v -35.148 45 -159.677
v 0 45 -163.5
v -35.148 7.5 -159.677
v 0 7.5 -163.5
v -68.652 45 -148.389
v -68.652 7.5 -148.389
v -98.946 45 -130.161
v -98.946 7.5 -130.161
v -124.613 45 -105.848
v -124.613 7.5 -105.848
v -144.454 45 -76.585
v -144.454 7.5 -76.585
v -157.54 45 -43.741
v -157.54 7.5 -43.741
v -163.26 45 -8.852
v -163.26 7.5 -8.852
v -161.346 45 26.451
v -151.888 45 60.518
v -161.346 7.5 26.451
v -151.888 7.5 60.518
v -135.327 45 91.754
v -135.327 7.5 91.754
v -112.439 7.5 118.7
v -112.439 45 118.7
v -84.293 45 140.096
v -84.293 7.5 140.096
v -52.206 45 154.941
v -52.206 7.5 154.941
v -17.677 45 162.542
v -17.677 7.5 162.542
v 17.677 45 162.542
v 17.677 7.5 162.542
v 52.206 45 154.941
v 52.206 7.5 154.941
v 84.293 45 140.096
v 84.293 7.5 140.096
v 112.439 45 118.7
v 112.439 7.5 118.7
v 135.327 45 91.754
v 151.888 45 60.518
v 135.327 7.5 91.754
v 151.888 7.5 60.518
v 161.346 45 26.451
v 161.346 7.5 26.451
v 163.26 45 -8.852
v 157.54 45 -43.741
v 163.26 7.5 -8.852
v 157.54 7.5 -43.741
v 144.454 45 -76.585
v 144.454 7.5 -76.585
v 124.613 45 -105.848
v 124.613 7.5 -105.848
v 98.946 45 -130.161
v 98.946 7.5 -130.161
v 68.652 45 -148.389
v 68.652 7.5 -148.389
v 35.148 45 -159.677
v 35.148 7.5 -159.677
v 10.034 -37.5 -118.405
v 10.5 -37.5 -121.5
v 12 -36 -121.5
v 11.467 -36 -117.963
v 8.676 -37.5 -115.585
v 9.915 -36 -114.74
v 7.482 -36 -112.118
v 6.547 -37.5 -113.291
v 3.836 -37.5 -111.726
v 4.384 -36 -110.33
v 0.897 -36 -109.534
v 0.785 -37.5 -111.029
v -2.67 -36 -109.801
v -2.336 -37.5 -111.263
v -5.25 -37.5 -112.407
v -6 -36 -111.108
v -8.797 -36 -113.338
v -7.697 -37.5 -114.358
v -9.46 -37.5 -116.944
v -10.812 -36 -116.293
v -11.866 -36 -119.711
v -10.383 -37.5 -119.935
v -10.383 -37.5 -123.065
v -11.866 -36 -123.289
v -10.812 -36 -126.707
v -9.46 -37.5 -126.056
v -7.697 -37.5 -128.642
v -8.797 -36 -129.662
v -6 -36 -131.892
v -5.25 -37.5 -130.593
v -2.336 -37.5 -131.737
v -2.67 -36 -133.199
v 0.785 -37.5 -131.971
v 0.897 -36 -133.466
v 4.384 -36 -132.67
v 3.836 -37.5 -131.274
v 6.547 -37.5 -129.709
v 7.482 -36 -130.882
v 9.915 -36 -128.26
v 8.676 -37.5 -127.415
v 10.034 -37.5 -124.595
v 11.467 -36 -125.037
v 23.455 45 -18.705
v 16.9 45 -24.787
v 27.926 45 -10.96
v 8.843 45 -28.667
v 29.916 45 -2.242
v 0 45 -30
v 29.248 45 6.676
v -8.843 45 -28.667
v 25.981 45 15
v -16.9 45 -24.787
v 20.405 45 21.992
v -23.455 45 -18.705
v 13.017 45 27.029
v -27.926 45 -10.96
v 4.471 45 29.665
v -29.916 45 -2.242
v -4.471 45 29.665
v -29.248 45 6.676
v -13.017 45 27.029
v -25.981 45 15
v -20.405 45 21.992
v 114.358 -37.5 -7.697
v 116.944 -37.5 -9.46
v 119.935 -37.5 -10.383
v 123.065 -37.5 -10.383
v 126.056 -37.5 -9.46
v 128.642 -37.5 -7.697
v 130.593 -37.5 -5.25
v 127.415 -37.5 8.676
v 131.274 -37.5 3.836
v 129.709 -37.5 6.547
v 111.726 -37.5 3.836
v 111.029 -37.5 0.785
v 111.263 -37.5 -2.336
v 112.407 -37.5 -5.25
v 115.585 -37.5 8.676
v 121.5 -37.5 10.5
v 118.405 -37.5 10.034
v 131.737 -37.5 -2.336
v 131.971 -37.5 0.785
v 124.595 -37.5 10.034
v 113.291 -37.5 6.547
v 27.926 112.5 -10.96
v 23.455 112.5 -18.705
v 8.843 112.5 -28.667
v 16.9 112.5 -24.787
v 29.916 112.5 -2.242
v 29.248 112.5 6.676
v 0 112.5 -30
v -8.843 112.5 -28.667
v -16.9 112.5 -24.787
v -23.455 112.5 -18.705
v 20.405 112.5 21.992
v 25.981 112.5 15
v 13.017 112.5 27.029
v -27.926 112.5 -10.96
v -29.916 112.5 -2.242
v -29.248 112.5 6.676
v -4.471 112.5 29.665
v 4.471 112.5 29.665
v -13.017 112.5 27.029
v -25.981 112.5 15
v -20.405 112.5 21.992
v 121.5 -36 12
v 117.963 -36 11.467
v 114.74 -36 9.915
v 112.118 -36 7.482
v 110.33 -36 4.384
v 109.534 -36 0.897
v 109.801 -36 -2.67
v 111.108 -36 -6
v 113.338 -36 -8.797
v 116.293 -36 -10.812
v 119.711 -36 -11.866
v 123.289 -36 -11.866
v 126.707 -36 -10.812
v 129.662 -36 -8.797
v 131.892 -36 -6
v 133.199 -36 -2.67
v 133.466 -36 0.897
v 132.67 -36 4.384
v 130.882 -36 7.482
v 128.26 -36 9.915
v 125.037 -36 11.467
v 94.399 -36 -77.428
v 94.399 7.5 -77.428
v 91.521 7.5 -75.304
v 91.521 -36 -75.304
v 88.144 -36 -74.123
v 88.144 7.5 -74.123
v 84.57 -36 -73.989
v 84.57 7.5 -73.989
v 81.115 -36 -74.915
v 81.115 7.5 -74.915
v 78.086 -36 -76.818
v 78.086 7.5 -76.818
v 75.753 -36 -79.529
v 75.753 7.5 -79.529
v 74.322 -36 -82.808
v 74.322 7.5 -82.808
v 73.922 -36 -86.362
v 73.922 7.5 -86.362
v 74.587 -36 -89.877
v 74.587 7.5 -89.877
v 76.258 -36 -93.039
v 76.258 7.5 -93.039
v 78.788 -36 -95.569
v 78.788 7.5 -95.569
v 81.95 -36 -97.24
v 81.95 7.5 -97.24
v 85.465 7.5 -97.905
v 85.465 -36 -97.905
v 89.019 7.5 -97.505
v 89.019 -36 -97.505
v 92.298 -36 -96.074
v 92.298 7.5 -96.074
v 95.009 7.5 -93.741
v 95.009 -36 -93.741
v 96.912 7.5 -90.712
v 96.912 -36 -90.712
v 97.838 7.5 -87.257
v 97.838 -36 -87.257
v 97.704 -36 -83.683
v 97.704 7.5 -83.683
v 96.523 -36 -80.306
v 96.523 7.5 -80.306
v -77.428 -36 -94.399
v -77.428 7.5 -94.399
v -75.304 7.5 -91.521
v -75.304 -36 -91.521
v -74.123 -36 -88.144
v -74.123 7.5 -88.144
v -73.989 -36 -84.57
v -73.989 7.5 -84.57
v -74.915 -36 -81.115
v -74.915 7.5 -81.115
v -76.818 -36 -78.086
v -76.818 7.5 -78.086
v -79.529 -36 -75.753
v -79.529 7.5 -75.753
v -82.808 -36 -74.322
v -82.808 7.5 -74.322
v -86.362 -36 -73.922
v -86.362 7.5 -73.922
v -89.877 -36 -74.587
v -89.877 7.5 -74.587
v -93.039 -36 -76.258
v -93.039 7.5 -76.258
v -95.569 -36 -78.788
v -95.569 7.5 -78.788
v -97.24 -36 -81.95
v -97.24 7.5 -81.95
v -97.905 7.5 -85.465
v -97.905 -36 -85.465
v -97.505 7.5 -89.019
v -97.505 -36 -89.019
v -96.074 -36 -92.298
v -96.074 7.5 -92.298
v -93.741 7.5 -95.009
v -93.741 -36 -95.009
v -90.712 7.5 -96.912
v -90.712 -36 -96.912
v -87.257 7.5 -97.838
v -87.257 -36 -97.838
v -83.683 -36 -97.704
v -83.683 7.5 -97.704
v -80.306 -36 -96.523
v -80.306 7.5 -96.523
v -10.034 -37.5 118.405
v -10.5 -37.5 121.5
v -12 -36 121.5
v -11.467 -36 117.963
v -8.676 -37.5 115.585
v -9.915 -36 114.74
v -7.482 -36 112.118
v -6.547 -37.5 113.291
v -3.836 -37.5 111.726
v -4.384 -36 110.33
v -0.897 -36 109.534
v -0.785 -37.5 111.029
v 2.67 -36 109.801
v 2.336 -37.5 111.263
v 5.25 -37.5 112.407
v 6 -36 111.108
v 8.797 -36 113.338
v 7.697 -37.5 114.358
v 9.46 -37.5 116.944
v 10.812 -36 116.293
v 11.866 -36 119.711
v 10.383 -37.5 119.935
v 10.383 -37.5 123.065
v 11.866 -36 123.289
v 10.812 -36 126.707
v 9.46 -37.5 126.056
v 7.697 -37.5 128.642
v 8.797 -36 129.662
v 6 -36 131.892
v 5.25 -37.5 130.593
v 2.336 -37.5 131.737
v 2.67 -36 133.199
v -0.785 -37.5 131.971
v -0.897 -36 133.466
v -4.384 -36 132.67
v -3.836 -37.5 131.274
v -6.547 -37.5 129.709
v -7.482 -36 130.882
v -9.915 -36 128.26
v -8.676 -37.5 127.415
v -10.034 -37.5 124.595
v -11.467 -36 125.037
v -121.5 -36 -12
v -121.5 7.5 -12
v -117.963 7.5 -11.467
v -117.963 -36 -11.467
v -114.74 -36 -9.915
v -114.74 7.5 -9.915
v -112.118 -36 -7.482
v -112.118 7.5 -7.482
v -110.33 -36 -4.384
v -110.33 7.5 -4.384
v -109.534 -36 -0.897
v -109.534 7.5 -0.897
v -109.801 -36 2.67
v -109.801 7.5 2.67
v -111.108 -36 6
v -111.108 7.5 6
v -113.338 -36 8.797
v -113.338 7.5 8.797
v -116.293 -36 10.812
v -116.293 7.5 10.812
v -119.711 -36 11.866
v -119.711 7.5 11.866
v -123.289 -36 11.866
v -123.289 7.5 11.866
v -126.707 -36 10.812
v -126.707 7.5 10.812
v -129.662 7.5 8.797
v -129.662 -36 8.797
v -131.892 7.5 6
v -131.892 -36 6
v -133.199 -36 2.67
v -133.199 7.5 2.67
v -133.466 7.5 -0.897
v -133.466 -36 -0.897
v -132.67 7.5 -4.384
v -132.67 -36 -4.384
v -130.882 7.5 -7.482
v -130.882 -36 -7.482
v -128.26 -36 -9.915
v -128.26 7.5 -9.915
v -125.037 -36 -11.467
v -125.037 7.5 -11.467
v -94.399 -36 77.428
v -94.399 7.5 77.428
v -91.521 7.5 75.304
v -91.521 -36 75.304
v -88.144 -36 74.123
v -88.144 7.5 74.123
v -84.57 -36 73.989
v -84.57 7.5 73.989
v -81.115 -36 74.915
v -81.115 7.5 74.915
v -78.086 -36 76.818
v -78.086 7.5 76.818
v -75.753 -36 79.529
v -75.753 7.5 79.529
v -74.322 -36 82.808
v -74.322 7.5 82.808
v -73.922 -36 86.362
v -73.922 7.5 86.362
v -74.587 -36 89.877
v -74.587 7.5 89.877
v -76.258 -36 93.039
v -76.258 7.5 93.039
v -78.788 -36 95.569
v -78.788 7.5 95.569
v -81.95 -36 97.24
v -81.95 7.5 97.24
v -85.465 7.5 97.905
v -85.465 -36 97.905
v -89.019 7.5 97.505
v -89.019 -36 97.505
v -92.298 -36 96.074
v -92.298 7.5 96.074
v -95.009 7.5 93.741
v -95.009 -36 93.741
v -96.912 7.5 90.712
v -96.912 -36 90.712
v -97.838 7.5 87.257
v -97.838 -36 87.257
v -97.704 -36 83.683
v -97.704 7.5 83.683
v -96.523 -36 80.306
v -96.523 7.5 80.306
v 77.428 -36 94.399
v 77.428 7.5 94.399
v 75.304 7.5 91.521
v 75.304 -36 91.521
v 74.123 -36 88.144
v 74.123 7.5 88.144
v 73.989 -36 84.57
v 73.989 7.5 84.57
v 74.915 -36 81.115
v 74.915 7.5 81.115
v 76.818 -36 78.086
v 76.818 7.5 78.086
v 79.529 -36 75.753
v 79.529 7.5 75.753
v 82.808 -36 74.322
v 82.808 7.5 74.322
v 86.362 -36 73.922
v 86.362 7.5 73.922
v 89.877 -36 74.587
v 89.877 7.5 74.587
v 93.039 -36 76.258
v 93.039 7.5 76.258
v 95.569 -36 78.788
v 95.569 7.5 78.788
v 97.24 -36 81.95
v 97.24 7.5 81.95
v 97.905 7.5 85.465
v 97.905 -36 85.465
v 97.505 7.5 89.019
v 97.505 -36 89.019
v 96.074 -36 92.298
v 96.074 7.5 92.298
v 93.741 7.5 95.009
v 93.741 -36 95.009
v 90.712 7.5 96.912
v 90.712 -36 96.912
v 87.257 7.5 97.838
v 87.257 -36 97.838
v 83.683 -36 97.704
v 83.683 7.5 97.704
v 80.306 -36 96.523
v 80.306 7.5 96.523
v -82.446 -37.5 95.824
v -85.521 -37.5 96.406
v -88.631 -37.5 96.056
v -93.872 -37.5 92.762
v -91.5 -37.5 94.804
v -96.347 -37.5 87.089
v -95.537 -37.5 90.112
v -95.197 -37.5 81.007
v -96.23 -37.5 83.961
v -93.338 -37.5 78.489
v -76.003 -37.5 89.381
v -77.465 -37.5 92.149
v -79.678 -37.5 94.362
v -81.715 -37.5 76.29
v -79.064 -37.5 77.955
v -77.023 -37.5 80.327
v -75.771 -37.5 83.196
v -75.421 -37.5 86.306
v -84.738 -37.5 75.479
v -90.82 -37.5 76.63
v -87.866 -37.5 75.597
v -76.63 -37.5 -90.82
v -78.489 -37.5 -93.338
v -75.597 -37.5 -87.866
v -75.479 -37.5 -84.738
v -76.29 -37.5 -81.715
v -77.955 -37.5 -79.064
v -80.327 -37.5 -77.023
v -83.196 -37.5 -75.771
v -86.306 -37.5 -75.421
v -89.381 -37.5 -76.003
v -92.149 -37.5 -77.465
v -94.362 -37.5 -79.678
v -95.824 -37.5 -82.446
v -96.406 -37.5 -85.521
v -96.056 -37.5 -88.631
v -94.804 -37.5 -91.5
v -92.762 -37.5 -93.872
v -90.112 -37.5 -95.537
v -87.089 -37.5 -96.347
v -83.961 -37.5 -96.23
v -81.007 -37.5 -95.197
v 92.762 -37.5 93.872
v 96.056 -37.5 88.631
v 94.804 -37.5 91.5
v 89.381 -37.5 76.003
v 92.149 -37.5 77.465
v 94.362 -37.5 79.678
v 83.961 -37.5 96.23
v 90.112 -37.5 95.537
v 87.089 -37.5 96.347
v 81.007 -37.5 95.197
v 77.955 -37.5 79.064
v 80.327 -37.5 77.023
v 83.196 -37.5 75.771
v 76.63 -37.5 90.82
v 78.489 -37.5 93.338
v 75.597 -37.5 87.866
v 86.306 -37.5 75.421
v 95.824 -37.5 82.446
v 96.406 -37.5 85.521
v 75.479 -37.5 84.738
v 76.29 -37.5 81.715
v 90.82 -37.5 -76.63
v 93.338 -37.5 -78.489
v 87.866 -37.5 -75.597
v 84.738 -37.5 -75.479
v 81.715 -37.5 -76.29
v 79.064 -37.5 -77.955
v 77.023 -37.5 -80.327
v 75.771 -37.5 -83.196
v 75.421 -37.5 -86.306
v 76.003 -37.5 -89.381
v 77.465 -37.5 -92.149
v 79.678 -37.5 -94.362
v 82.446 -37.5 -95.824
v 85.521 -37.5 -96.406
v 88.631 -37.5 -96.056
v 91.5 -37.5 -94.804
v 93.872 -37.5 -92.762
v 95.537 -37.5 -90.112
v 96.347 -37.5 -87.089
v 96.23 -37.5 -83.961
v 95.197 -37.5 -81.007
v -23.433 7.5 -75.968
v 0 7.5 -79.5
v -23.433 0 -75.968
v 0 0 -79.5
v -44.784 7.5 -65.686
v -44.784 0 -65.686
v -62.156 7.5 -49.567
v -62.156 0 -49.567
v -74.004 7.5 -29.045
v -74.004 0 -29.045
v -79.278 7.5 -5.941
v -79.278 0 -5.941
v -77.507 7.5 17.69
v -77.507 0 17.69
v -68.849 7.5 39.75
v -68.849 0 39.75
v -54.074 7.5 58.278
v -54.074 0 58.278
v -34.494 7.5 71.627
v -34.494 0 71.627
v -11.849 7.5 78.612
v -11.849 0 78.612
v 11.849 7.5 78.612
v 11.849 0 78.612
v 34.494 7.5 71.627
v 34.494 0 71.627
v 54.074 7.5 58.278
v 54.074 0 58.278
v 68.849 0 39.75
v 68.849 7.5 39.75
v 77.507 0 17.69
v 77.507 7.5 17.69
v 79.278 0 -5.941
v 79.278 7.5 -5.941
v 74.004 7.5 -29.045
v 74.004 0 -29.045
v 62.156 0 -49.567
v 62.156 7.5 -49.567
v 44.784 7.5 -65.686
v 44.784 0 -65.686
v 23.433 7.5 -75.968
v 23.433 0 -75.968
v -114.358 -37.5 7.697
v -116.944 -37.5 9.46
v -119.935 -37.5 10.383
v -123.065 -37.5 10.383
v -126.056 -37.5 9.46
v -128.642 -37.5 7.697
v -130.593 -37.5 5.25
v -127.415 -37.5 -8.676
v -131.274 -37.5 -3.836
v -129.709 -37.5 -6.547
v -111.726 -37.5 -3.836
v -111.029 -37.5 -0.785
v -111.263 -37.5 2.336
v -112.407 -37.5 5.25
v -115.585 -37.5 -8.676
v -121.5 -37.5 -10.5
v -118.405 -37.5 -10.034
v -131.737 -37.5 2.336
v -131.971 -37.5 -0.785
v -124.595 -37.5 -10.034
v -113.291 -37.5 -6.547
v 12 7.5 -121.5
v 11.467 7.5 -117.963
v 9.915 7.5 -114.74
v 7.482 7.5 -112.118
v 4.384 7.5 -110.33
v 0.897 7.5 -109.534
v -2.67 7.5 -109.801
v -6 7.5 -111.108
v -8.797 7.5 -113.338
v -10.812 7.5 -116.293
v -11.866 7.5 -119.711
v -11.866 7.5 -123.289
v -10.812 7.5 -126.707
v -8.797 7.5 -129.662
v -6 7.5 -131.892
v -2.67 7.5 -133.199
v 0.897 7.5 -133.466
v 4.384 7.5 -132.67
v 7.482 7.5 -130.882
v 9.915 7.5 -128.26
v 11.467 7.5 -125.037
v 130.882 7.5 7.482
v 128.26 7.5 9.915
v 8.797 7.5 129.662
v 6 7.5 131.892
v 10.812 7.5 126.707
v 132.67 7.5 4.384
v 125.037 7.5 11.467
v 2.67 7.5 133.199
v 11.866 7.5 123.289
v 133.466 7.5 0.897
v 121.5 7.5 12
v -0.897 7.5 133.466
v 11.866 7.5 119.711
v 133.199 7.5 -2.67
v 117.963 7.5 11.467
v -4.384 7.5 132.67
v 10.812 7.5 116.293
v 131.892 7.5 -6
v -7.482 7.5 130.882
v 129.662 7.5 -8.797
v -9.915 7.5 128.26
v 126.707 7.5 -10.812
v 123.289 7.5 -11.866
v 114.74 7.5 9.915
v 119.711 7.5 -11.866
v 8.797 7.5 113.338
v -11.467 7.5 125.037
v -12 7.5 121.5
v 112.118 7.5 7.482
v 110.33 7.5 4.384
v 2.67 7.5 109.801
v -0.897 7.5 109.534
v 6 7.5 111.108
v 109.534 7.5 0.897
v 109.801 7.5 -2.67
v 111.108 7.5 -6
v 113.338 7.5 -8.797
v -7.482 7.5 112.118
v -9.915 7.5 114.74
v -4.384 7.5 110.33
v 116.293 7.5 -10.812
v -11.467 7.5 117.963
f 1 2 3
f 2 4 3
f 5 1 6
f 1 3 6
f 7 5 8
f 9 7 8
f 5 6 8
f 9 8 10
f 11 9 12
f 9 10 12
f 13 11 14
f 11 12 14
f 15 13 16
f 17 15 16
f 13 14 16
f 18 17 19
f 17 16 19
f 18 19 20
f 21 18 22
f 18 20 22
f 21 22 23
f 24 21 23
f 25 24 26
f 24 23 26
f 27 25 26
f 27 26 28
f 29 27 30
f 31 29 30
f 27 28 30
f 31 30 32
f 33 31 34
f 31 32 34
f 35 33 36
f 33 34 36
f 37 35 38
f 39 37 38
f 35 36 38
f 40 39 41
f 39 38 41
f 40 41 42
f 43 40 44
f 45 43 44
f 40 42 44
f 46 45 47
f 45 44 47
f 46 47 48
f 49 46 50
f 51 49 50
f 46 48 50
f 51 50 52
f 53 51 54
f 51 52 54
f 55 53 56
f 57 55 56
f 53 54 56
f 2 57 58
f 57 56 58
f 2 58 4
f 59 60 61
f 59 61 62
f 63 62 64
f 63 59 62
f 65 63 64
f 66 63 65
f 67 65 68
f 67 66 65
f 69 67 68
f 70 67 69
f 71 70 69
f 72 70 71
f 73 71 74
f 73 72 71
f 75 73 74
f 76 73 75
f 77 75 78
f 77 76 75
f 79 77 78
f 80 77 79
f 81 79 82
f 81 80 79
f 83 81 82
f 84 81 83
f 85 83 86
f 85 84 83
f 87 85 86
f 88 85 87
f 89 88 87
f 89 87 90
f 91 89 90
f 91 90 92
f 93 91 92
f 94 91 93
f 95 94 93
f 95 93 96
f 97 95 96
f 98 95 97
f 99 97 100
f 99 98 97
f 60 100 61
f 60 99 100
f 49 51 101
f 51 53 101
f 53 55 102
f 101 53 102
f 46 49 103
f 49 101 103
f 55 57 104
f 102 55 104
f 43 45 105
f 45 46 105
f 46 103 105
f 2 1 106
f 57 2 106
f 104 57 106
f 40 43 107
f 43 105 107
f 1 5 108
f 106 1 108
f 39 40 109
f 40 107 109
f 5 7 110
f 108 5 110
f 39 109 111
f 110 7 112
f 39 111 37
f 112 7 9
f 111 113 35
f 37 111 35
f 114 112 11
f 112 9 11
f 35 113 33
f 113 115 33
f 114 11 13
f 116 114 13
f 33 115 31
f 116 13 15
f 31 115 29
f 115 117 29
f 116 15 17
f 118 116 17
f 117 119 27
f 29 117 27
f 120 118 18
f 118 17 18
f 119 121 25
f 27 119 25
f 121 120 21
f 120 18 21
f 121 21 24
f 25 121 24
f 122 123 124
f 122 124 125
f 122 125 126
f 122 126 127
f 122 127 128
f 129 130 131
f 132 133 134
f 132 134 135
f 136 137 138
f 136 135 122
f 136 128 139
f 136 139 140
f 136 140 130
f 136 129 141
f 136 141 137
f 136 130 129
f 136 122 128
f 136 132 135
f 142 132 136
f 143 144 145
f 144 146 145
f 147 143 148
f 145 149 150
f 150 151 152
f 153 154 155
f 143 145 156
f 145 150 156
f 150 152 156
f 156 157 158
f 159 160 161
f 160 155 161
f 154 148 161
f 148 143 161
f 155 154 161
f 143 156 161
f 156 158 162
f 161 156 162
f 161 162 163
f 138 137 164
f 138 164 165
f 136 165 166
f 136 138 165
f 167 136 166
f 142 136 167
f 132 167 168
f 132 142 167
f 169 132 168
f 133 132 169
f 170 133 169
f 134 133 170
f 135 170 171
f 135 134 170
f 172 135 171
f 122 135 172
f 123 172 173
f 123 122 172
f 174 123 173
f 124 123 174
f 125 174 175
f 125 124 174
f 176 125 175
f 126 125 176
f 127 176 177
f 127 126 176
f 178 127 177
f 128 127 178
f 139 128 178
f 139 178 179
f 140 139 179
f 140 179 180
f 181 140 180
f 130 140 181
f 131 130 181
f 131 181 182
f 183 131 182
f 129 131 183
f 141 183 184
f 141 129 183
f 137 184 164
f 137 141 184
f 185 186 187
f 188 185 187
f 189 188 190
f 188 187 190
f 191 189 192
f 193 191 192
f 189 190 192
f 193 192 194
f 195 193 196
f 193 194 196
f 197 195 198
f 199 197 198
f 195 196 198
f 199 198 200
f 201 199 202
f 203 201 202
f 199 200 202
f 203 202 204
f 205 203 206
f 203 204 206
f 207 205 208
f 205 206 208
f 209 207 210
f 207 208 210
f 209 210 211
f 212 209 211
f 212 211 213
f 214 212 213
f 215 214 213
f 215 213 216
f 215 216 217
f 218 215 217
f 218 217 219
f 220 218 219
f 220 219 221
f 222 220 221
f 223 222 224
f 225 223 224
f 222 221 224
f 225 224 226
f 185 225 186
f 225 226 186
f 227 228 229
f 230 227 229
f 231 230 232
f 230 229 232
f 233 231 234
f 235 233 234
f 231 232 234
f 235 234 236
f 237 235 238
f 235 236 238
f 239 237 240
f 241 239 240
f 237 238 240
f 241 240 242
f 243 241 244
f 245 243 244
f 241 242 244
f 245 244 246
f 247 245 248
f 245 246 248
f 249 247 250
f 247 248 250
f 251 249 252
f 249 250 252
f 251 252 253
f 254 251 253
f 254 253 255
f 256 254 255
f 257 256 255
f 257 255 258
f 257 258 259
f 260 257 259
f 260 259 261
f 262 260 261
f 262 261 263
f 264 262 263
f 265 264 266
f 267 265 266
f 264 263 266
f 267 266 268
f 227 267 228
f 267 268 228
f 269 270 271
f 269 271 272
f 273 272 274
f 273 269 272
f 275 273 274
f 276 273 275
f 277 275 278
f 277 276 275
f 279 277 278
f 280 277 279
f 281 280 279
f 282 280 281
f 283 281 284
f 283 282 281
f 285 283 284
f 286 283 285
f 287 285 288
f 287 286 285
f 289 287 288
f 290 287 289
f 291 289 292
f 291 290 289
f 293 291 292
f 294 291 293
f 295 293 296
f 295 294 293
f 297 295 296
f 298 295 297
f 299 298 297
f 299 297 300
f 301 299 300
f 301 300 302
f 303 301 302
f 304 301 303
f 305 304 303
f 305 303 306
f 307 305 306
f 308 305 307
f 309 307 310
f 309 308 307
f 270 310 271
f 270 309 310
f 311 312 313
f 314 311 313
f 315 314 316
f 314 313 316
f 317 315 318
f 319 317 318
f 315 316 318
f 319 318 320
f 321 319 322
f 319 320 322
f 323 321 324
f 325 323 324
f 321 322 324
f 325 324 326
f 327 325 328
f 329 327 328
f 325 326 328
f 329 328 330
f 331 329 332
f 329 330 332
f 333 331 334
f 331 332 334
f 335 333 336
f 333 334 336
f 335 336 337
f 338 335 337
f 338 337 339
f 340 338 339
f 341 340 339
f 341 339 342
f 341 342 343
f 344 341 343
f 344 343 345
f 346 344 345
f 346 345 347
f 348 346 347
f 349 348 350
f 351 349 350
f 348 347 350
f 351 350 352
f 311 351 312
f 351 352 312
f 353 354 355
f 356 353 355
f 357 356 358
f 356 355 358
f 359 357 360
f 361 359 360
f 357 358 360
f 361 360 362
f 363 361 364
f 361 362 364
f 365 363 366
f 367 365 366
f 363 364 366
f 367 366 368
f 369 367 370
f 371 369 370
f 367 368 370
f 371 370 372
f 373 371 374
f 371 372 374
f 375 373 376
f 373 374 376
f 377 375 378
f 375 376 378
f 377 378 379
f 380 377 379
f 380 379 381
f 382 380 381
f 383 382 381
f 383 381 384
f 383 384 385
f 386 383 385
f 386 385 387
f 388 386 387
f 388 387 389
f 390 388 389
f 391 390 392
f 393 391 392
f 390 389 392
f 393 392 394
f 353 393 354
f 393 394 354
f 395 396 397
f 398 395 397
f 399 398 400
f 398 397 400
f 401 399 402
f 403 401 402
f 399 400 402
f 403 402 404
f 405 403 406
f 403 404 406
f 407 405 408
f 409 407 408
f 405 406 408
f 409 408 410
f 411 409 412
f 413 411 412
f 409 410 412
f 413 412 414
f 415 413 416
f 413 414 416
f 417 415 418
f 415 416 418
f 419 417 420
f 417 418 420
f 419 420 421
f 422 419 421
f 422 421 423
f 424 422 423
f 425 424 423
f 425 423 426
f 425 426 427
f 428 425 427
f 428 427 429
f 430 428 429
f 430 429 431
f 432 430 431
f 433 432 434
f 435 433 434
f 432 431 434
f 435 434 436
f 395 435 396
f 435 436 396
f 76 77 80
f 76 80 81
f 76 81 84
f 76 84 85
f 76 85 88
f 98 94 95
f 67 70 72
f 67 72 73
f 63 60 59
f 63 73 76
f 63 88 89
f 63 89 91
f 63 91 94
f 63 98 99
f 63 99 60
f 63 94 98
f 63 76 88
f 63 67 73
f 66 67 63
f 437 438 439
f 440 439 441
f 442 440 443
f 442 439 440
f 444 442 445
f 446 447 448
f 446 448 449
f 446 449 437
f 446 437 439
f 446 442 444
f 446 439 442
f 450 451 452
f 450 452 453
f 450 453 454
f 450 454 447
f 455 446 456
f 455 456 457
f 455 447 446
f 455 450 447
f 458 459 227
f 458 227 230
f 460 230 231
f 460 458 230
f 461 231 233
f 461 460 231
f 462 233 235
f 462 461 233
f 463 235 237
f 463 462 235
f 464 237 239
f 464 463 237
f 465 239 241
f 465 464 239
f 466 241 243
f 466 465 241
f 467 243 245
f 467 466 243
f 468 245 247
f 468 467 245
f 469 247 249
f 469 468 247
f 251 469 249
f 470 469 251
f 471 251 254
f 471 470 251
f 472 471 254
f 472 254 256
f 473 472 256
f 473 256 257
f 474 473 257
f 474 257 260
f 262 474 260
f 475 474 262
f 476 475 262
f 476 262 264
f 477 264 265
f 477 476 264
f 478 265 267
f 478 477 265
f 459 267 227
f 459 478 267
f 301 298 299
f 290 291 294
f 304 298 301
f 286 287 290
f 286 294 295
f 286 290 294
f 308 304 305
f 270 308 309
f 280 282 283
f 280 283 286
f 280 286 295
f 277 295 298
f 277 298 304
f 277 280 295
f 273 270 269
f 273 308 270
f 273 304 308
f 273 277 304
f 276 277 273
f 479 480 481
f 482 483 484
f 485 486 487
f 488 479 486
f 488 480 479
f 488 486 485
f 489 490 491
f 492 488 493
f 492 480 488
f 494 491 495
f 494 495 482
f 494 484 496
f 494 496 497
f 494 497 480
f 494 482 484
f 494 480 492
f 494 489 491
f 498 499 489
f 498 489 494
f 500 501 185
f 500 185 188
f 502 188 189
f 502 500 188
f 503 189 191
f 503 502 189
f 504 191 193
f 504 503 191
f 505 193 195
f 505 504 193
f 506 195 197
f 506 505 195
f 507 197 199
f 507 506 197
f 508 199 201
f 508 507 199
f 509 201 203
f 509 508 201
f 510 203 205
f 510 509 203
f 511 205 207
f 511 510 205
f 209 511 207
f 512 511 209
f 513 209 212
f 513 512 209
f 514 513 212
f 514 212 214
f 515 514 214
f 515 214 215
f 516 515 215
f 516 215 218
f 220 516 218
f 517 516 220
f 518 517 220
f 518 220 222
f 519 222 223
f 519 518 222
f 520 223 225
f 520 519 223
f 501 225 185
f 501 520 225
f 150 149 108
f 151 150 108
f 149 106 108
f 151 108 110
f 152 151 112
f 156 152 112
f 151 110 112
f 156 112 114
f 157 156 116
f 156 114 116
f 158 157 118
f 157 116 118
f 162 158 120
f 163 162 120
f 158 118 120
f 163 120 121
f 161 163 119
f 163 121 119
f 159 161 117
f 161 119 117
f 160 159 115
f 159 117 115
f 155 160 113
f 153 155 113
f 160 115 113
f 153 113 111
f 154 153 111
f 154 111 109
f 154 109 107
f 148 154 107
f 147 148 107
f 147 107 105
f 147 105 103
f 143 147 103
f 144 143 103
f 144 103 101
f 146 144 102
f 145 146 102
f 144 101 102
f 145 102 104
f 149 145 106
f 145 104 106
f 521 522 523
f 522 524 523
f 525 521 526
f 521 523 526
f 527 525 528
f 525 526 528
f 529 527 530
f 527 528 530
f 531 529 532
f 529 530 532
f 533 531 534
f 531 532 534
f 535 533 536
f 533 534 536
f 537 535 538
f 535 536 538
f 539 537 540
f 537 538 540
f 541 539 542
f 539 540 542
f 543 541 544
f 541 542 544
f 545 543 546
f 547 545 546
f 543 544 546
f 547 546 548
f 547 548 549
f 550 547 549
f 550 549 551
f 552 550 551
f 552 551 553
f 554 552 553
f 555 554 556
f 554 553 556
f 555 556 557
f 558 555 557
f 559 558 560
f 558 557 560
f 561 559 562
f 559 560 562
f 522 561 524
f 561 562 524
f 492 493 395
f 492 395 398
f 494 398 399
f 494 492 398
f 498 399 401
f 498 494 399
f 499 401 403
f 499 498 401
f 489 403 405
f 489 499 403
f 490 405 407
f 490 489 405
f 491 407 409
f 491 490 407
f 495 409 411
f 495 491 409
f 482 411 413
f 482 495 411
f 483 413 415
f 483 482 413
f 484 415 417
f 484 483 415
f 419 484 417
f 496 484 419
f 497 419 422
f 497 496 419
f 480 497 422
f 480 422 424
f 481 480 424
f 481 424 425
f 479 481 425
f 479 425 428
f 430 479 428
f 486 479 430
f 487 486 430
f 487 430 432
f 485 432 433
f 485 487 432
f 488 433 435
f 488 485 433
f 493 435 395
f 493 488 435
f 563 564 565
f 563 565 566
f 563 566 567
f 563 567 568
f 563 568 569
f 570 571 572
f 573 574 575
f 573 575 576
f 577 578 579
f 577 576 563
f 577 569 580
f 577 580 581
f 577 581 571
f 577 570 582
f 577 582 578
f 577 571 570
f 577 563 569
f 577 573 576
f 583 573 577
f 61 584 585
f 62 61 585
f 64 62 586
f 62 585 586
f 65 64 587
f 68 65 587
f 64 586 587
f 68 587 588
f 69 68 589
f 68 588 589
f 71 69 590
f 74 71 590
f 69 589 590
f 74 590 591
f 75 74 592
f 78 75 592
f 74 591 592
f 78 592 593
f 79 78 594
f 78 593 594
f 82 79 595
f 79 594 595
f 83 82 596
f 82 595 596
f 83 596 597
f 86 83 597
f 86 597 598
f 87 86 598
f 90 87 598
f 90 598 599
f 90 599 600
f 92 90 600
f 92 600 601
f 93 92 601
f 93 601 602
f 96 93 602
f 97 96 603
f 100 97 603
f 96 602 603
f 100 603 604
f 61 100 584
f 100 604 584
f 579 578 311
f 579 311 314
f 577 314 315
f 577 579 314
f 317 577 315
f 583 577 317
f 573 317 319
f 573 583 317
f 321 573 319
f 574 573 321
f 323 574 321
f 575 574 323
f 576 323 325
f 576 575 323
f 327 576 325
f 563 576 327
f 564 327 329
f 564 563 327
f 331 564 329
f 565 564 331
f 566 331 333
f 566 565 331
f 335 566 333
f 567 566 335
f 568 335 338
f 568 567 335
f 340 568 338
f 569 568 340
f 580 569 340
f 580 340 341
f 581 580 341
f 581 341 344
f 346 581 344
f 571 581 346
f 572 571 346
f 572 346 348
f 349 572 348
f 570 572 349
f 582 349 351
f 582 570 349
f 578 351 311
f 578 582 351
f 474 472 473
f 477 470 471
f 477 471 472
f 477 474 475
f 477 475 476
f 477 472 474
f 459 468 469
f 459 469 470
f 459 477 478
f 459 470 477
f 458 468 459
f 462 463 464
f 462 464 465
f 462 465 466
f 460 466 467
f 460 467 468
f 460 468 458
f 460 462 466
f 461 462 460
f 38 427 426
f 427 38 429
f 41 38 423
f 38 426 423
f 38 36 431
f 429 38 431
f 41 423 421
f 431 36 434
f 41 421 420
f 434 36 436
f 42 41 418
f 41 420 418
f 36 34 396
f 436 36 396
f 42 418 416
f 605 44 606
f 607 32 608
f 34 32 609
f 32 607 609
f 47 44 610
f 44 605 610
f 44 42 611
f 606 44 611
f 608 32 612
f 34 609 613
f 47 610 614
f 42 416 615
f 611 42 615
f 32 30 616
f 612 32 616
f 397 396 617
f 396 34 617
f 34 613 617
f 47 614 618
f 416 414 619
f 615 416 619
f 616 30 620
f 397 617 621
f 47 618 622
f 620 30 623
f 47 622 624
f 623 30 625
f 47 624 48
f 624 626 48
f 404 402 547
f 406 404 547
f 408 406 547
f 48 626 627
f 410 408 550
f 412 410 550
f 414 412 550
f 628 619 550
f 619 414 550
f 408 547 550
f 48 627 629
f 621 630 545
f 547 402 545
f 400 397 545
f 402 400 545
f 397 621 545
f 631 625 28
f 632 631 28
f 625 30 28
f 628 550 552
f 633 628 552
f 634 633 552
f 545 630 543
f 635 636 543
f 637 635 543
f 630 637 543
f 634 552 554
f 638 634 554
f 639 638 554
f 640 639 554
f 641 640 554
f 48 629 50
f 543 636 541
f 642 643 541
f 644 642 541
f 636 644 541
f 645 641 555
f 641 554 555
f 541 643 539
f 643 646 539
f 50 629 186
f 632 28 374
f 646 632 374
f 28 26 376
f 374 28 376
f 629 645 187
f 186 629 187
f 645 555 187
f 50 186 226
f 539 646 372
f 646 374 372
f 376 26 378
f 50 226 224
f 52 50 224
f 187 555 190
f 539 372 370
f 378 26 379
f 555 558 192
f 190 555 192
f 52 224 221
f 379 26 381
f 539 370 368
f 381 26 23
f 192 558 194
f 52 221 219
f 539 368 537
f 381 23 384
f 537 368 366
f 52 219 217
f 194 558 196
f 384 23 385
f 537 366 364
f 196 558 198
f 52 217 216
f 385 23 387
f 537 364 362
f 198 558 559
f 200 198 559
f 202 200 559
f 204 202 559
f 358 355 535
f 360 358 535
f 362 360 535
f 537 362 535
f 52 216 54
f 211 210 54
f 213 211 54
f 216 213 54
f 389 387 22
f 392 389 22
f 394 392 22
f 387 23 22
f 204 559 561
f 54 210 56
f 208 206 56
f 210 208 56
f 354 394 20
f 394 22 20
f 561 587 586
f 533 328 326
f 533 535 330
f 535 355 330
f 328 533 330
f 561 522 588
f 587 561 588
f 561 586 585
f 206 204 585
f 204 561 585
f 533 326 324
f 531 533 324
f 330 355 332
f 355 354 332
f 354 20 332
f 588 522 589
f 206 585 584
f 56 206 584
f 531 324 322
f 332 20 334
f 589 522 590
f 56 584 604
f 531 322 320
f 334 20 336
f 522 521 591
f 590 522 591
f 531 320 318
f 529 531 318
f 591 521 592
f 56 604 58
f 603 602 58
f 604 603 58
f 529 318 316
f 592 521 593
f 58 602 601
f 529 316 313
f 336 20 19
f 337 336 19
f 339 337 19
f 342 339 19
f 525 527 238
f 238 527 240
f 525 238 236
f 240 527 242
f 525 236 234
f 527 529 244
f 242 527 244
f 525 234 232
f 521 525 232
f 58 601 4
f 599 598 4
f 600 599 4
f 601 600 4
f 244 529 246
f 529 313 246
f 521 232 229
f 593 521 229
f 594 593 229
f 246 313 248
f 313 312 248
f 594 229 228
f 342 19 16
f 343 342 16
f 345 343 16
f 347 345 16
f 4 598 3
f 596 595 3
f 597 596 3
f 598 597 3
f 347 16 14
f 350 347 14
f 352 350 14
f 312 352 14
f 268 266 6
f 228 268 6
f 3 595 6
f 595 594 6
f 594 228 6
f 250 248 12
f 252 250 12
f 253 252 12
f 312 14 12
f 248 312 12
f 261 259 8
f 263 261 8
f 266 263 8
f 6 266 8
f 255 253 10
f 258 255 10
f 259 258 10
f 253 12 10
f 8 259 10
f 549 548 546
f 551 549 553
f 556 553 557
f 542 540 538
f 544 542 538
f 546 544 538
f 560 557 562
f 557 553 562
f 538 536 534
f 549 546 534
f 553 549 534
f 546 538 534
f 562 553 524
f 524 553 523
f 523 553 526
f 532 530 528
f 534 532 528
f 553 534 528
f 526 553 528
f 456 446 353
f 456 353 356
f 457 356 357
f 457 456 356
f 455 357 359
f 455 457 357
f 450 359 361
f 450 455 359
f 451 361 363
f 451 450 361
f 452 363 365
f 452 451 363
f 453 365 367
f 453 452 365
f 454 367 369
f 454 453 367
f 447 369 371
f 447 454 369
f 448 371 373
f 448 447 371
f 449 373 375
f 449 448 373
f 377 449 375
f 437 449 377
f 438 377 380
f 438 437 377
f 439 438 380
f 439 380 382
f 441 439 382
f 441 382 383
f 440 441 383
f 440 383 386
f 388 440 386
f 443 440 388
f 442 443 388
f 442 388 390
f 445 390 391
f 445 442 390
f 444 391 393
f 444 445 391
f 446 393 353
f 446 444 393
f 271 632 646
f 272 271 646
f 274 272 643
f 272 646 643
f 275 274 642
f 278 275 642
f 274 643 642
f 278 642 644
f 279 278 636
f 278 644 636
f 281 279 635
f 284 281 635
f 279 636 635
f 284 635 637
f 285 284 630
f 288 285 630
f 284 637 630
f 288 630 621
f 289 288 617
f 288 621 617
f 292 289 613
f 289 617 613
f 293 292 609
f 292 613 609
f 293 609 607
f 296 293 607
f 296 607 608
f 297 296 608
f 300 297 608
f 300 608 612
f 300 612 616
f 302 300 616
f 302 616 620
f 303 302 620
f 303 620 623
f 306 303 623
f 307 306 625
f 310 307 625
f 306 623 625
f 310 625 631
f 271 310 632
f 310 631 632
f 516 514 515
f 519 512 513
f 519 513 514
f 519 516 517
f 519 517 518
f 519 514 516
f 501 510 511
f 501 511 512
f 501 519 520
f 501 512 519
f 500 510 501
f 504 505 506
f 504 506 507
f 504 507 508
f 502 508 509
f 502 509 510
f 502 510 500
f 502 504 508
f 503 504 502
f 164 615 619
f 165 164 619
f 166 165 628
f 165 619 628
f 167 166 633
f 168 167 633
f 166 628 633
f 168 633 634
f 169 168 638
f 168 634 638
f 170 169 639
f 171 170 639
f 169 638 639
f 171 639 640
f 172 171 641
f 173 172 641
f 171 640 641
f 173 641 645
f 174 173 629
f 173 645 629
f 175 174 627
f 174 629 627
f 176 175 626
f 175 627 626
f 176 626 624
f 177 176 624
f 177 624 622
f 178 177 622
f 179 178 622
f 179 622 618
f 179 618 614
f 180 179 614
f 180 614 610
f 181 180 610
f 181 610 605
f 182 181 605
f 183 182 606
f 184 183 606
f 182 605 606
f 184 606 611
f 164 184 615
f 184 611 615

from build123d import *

# Parameters (mm, degrees)
SKETCH2_R                    = 12
BOSS_EXTRUDE1_DEPTH          = 45
CHAMFER1_SIZE                = 1.5
CIRPATTERN1_COUNT            = 8
CHAMFER1_OF_CIRPATTERN1_SIZE = 1.5


with BuildPart() as part:
    # Sketch1 → Revolve1 (revolve)
    with BuildSketch(Plane.XY, mode=Mode.PRIVATE) as revolve1_sk:
        Polygon((0, 0), (0, 112.5), (30, 112.5), (30, 45), (163.5, 45), (163.5, 7.5), (79.5, 7.5), (79.5, 0), align=None)
    revolve(revolve1_sk.sketch.rotate(Axis((0, 0, 0), (0, 1, 0)), 90), axis=Axis((0, 0, 0), (0, 1, 0)))

    # Sketch2 → Boss-Extrude1 (add)
    with BuildSketch(Plane.XZ.offset(-7.5)):
        with Locations(Location((121.5, 0, 0), (0, 0, 90))):
            Circle(SKETCH2_R)
    boss_extrude1 = extrude(amount=BOSS_EXTRUDE1_DEPTH)

    # Chamfer1
    chamfer1_edges = [part.edges().sort_by_distance(p)[0] for p in [
        (121.5, -37.5, -12),
    ]]
    chamfer(chamfer1_edges, length=CHAMFER1_SIZE)

    # CirPattern1: Boss-Extrude1 ×8 about axis
    cirpattern1_axis = Axis((0, 0, 0), (0, 1, 0))
    for i in range(1, CIRPATTERN1_COUNT):
        add(boss_extrude1.rotate(cirpattern1_axis, i * 360 / CIRPATTERN1_COUNT))

    # Chamfer1 of CirPattern1
    chamfer1_of_cirpattern1_edges = [part.edges().sort_by_distance(p)[0] for p in [
        (77.42819254, -37.5, -94.398755288),
        (-12, -37.5, -121.5),
        (-94.398755288, -37.5, -77.42819254),
        (-121.5, -37.5, 12),
        (-77.42819254, -37.5, 94.398755288),
        (12, -37.5, 121.5),
        (94.398755288, -37.5, 77.42819254),
    ]]
    chamfer(chamfer1_of_cirpattern1_edges, length=CHAMFER1_OF_CIRPATTERN1_SIZE)


solid = part.part
